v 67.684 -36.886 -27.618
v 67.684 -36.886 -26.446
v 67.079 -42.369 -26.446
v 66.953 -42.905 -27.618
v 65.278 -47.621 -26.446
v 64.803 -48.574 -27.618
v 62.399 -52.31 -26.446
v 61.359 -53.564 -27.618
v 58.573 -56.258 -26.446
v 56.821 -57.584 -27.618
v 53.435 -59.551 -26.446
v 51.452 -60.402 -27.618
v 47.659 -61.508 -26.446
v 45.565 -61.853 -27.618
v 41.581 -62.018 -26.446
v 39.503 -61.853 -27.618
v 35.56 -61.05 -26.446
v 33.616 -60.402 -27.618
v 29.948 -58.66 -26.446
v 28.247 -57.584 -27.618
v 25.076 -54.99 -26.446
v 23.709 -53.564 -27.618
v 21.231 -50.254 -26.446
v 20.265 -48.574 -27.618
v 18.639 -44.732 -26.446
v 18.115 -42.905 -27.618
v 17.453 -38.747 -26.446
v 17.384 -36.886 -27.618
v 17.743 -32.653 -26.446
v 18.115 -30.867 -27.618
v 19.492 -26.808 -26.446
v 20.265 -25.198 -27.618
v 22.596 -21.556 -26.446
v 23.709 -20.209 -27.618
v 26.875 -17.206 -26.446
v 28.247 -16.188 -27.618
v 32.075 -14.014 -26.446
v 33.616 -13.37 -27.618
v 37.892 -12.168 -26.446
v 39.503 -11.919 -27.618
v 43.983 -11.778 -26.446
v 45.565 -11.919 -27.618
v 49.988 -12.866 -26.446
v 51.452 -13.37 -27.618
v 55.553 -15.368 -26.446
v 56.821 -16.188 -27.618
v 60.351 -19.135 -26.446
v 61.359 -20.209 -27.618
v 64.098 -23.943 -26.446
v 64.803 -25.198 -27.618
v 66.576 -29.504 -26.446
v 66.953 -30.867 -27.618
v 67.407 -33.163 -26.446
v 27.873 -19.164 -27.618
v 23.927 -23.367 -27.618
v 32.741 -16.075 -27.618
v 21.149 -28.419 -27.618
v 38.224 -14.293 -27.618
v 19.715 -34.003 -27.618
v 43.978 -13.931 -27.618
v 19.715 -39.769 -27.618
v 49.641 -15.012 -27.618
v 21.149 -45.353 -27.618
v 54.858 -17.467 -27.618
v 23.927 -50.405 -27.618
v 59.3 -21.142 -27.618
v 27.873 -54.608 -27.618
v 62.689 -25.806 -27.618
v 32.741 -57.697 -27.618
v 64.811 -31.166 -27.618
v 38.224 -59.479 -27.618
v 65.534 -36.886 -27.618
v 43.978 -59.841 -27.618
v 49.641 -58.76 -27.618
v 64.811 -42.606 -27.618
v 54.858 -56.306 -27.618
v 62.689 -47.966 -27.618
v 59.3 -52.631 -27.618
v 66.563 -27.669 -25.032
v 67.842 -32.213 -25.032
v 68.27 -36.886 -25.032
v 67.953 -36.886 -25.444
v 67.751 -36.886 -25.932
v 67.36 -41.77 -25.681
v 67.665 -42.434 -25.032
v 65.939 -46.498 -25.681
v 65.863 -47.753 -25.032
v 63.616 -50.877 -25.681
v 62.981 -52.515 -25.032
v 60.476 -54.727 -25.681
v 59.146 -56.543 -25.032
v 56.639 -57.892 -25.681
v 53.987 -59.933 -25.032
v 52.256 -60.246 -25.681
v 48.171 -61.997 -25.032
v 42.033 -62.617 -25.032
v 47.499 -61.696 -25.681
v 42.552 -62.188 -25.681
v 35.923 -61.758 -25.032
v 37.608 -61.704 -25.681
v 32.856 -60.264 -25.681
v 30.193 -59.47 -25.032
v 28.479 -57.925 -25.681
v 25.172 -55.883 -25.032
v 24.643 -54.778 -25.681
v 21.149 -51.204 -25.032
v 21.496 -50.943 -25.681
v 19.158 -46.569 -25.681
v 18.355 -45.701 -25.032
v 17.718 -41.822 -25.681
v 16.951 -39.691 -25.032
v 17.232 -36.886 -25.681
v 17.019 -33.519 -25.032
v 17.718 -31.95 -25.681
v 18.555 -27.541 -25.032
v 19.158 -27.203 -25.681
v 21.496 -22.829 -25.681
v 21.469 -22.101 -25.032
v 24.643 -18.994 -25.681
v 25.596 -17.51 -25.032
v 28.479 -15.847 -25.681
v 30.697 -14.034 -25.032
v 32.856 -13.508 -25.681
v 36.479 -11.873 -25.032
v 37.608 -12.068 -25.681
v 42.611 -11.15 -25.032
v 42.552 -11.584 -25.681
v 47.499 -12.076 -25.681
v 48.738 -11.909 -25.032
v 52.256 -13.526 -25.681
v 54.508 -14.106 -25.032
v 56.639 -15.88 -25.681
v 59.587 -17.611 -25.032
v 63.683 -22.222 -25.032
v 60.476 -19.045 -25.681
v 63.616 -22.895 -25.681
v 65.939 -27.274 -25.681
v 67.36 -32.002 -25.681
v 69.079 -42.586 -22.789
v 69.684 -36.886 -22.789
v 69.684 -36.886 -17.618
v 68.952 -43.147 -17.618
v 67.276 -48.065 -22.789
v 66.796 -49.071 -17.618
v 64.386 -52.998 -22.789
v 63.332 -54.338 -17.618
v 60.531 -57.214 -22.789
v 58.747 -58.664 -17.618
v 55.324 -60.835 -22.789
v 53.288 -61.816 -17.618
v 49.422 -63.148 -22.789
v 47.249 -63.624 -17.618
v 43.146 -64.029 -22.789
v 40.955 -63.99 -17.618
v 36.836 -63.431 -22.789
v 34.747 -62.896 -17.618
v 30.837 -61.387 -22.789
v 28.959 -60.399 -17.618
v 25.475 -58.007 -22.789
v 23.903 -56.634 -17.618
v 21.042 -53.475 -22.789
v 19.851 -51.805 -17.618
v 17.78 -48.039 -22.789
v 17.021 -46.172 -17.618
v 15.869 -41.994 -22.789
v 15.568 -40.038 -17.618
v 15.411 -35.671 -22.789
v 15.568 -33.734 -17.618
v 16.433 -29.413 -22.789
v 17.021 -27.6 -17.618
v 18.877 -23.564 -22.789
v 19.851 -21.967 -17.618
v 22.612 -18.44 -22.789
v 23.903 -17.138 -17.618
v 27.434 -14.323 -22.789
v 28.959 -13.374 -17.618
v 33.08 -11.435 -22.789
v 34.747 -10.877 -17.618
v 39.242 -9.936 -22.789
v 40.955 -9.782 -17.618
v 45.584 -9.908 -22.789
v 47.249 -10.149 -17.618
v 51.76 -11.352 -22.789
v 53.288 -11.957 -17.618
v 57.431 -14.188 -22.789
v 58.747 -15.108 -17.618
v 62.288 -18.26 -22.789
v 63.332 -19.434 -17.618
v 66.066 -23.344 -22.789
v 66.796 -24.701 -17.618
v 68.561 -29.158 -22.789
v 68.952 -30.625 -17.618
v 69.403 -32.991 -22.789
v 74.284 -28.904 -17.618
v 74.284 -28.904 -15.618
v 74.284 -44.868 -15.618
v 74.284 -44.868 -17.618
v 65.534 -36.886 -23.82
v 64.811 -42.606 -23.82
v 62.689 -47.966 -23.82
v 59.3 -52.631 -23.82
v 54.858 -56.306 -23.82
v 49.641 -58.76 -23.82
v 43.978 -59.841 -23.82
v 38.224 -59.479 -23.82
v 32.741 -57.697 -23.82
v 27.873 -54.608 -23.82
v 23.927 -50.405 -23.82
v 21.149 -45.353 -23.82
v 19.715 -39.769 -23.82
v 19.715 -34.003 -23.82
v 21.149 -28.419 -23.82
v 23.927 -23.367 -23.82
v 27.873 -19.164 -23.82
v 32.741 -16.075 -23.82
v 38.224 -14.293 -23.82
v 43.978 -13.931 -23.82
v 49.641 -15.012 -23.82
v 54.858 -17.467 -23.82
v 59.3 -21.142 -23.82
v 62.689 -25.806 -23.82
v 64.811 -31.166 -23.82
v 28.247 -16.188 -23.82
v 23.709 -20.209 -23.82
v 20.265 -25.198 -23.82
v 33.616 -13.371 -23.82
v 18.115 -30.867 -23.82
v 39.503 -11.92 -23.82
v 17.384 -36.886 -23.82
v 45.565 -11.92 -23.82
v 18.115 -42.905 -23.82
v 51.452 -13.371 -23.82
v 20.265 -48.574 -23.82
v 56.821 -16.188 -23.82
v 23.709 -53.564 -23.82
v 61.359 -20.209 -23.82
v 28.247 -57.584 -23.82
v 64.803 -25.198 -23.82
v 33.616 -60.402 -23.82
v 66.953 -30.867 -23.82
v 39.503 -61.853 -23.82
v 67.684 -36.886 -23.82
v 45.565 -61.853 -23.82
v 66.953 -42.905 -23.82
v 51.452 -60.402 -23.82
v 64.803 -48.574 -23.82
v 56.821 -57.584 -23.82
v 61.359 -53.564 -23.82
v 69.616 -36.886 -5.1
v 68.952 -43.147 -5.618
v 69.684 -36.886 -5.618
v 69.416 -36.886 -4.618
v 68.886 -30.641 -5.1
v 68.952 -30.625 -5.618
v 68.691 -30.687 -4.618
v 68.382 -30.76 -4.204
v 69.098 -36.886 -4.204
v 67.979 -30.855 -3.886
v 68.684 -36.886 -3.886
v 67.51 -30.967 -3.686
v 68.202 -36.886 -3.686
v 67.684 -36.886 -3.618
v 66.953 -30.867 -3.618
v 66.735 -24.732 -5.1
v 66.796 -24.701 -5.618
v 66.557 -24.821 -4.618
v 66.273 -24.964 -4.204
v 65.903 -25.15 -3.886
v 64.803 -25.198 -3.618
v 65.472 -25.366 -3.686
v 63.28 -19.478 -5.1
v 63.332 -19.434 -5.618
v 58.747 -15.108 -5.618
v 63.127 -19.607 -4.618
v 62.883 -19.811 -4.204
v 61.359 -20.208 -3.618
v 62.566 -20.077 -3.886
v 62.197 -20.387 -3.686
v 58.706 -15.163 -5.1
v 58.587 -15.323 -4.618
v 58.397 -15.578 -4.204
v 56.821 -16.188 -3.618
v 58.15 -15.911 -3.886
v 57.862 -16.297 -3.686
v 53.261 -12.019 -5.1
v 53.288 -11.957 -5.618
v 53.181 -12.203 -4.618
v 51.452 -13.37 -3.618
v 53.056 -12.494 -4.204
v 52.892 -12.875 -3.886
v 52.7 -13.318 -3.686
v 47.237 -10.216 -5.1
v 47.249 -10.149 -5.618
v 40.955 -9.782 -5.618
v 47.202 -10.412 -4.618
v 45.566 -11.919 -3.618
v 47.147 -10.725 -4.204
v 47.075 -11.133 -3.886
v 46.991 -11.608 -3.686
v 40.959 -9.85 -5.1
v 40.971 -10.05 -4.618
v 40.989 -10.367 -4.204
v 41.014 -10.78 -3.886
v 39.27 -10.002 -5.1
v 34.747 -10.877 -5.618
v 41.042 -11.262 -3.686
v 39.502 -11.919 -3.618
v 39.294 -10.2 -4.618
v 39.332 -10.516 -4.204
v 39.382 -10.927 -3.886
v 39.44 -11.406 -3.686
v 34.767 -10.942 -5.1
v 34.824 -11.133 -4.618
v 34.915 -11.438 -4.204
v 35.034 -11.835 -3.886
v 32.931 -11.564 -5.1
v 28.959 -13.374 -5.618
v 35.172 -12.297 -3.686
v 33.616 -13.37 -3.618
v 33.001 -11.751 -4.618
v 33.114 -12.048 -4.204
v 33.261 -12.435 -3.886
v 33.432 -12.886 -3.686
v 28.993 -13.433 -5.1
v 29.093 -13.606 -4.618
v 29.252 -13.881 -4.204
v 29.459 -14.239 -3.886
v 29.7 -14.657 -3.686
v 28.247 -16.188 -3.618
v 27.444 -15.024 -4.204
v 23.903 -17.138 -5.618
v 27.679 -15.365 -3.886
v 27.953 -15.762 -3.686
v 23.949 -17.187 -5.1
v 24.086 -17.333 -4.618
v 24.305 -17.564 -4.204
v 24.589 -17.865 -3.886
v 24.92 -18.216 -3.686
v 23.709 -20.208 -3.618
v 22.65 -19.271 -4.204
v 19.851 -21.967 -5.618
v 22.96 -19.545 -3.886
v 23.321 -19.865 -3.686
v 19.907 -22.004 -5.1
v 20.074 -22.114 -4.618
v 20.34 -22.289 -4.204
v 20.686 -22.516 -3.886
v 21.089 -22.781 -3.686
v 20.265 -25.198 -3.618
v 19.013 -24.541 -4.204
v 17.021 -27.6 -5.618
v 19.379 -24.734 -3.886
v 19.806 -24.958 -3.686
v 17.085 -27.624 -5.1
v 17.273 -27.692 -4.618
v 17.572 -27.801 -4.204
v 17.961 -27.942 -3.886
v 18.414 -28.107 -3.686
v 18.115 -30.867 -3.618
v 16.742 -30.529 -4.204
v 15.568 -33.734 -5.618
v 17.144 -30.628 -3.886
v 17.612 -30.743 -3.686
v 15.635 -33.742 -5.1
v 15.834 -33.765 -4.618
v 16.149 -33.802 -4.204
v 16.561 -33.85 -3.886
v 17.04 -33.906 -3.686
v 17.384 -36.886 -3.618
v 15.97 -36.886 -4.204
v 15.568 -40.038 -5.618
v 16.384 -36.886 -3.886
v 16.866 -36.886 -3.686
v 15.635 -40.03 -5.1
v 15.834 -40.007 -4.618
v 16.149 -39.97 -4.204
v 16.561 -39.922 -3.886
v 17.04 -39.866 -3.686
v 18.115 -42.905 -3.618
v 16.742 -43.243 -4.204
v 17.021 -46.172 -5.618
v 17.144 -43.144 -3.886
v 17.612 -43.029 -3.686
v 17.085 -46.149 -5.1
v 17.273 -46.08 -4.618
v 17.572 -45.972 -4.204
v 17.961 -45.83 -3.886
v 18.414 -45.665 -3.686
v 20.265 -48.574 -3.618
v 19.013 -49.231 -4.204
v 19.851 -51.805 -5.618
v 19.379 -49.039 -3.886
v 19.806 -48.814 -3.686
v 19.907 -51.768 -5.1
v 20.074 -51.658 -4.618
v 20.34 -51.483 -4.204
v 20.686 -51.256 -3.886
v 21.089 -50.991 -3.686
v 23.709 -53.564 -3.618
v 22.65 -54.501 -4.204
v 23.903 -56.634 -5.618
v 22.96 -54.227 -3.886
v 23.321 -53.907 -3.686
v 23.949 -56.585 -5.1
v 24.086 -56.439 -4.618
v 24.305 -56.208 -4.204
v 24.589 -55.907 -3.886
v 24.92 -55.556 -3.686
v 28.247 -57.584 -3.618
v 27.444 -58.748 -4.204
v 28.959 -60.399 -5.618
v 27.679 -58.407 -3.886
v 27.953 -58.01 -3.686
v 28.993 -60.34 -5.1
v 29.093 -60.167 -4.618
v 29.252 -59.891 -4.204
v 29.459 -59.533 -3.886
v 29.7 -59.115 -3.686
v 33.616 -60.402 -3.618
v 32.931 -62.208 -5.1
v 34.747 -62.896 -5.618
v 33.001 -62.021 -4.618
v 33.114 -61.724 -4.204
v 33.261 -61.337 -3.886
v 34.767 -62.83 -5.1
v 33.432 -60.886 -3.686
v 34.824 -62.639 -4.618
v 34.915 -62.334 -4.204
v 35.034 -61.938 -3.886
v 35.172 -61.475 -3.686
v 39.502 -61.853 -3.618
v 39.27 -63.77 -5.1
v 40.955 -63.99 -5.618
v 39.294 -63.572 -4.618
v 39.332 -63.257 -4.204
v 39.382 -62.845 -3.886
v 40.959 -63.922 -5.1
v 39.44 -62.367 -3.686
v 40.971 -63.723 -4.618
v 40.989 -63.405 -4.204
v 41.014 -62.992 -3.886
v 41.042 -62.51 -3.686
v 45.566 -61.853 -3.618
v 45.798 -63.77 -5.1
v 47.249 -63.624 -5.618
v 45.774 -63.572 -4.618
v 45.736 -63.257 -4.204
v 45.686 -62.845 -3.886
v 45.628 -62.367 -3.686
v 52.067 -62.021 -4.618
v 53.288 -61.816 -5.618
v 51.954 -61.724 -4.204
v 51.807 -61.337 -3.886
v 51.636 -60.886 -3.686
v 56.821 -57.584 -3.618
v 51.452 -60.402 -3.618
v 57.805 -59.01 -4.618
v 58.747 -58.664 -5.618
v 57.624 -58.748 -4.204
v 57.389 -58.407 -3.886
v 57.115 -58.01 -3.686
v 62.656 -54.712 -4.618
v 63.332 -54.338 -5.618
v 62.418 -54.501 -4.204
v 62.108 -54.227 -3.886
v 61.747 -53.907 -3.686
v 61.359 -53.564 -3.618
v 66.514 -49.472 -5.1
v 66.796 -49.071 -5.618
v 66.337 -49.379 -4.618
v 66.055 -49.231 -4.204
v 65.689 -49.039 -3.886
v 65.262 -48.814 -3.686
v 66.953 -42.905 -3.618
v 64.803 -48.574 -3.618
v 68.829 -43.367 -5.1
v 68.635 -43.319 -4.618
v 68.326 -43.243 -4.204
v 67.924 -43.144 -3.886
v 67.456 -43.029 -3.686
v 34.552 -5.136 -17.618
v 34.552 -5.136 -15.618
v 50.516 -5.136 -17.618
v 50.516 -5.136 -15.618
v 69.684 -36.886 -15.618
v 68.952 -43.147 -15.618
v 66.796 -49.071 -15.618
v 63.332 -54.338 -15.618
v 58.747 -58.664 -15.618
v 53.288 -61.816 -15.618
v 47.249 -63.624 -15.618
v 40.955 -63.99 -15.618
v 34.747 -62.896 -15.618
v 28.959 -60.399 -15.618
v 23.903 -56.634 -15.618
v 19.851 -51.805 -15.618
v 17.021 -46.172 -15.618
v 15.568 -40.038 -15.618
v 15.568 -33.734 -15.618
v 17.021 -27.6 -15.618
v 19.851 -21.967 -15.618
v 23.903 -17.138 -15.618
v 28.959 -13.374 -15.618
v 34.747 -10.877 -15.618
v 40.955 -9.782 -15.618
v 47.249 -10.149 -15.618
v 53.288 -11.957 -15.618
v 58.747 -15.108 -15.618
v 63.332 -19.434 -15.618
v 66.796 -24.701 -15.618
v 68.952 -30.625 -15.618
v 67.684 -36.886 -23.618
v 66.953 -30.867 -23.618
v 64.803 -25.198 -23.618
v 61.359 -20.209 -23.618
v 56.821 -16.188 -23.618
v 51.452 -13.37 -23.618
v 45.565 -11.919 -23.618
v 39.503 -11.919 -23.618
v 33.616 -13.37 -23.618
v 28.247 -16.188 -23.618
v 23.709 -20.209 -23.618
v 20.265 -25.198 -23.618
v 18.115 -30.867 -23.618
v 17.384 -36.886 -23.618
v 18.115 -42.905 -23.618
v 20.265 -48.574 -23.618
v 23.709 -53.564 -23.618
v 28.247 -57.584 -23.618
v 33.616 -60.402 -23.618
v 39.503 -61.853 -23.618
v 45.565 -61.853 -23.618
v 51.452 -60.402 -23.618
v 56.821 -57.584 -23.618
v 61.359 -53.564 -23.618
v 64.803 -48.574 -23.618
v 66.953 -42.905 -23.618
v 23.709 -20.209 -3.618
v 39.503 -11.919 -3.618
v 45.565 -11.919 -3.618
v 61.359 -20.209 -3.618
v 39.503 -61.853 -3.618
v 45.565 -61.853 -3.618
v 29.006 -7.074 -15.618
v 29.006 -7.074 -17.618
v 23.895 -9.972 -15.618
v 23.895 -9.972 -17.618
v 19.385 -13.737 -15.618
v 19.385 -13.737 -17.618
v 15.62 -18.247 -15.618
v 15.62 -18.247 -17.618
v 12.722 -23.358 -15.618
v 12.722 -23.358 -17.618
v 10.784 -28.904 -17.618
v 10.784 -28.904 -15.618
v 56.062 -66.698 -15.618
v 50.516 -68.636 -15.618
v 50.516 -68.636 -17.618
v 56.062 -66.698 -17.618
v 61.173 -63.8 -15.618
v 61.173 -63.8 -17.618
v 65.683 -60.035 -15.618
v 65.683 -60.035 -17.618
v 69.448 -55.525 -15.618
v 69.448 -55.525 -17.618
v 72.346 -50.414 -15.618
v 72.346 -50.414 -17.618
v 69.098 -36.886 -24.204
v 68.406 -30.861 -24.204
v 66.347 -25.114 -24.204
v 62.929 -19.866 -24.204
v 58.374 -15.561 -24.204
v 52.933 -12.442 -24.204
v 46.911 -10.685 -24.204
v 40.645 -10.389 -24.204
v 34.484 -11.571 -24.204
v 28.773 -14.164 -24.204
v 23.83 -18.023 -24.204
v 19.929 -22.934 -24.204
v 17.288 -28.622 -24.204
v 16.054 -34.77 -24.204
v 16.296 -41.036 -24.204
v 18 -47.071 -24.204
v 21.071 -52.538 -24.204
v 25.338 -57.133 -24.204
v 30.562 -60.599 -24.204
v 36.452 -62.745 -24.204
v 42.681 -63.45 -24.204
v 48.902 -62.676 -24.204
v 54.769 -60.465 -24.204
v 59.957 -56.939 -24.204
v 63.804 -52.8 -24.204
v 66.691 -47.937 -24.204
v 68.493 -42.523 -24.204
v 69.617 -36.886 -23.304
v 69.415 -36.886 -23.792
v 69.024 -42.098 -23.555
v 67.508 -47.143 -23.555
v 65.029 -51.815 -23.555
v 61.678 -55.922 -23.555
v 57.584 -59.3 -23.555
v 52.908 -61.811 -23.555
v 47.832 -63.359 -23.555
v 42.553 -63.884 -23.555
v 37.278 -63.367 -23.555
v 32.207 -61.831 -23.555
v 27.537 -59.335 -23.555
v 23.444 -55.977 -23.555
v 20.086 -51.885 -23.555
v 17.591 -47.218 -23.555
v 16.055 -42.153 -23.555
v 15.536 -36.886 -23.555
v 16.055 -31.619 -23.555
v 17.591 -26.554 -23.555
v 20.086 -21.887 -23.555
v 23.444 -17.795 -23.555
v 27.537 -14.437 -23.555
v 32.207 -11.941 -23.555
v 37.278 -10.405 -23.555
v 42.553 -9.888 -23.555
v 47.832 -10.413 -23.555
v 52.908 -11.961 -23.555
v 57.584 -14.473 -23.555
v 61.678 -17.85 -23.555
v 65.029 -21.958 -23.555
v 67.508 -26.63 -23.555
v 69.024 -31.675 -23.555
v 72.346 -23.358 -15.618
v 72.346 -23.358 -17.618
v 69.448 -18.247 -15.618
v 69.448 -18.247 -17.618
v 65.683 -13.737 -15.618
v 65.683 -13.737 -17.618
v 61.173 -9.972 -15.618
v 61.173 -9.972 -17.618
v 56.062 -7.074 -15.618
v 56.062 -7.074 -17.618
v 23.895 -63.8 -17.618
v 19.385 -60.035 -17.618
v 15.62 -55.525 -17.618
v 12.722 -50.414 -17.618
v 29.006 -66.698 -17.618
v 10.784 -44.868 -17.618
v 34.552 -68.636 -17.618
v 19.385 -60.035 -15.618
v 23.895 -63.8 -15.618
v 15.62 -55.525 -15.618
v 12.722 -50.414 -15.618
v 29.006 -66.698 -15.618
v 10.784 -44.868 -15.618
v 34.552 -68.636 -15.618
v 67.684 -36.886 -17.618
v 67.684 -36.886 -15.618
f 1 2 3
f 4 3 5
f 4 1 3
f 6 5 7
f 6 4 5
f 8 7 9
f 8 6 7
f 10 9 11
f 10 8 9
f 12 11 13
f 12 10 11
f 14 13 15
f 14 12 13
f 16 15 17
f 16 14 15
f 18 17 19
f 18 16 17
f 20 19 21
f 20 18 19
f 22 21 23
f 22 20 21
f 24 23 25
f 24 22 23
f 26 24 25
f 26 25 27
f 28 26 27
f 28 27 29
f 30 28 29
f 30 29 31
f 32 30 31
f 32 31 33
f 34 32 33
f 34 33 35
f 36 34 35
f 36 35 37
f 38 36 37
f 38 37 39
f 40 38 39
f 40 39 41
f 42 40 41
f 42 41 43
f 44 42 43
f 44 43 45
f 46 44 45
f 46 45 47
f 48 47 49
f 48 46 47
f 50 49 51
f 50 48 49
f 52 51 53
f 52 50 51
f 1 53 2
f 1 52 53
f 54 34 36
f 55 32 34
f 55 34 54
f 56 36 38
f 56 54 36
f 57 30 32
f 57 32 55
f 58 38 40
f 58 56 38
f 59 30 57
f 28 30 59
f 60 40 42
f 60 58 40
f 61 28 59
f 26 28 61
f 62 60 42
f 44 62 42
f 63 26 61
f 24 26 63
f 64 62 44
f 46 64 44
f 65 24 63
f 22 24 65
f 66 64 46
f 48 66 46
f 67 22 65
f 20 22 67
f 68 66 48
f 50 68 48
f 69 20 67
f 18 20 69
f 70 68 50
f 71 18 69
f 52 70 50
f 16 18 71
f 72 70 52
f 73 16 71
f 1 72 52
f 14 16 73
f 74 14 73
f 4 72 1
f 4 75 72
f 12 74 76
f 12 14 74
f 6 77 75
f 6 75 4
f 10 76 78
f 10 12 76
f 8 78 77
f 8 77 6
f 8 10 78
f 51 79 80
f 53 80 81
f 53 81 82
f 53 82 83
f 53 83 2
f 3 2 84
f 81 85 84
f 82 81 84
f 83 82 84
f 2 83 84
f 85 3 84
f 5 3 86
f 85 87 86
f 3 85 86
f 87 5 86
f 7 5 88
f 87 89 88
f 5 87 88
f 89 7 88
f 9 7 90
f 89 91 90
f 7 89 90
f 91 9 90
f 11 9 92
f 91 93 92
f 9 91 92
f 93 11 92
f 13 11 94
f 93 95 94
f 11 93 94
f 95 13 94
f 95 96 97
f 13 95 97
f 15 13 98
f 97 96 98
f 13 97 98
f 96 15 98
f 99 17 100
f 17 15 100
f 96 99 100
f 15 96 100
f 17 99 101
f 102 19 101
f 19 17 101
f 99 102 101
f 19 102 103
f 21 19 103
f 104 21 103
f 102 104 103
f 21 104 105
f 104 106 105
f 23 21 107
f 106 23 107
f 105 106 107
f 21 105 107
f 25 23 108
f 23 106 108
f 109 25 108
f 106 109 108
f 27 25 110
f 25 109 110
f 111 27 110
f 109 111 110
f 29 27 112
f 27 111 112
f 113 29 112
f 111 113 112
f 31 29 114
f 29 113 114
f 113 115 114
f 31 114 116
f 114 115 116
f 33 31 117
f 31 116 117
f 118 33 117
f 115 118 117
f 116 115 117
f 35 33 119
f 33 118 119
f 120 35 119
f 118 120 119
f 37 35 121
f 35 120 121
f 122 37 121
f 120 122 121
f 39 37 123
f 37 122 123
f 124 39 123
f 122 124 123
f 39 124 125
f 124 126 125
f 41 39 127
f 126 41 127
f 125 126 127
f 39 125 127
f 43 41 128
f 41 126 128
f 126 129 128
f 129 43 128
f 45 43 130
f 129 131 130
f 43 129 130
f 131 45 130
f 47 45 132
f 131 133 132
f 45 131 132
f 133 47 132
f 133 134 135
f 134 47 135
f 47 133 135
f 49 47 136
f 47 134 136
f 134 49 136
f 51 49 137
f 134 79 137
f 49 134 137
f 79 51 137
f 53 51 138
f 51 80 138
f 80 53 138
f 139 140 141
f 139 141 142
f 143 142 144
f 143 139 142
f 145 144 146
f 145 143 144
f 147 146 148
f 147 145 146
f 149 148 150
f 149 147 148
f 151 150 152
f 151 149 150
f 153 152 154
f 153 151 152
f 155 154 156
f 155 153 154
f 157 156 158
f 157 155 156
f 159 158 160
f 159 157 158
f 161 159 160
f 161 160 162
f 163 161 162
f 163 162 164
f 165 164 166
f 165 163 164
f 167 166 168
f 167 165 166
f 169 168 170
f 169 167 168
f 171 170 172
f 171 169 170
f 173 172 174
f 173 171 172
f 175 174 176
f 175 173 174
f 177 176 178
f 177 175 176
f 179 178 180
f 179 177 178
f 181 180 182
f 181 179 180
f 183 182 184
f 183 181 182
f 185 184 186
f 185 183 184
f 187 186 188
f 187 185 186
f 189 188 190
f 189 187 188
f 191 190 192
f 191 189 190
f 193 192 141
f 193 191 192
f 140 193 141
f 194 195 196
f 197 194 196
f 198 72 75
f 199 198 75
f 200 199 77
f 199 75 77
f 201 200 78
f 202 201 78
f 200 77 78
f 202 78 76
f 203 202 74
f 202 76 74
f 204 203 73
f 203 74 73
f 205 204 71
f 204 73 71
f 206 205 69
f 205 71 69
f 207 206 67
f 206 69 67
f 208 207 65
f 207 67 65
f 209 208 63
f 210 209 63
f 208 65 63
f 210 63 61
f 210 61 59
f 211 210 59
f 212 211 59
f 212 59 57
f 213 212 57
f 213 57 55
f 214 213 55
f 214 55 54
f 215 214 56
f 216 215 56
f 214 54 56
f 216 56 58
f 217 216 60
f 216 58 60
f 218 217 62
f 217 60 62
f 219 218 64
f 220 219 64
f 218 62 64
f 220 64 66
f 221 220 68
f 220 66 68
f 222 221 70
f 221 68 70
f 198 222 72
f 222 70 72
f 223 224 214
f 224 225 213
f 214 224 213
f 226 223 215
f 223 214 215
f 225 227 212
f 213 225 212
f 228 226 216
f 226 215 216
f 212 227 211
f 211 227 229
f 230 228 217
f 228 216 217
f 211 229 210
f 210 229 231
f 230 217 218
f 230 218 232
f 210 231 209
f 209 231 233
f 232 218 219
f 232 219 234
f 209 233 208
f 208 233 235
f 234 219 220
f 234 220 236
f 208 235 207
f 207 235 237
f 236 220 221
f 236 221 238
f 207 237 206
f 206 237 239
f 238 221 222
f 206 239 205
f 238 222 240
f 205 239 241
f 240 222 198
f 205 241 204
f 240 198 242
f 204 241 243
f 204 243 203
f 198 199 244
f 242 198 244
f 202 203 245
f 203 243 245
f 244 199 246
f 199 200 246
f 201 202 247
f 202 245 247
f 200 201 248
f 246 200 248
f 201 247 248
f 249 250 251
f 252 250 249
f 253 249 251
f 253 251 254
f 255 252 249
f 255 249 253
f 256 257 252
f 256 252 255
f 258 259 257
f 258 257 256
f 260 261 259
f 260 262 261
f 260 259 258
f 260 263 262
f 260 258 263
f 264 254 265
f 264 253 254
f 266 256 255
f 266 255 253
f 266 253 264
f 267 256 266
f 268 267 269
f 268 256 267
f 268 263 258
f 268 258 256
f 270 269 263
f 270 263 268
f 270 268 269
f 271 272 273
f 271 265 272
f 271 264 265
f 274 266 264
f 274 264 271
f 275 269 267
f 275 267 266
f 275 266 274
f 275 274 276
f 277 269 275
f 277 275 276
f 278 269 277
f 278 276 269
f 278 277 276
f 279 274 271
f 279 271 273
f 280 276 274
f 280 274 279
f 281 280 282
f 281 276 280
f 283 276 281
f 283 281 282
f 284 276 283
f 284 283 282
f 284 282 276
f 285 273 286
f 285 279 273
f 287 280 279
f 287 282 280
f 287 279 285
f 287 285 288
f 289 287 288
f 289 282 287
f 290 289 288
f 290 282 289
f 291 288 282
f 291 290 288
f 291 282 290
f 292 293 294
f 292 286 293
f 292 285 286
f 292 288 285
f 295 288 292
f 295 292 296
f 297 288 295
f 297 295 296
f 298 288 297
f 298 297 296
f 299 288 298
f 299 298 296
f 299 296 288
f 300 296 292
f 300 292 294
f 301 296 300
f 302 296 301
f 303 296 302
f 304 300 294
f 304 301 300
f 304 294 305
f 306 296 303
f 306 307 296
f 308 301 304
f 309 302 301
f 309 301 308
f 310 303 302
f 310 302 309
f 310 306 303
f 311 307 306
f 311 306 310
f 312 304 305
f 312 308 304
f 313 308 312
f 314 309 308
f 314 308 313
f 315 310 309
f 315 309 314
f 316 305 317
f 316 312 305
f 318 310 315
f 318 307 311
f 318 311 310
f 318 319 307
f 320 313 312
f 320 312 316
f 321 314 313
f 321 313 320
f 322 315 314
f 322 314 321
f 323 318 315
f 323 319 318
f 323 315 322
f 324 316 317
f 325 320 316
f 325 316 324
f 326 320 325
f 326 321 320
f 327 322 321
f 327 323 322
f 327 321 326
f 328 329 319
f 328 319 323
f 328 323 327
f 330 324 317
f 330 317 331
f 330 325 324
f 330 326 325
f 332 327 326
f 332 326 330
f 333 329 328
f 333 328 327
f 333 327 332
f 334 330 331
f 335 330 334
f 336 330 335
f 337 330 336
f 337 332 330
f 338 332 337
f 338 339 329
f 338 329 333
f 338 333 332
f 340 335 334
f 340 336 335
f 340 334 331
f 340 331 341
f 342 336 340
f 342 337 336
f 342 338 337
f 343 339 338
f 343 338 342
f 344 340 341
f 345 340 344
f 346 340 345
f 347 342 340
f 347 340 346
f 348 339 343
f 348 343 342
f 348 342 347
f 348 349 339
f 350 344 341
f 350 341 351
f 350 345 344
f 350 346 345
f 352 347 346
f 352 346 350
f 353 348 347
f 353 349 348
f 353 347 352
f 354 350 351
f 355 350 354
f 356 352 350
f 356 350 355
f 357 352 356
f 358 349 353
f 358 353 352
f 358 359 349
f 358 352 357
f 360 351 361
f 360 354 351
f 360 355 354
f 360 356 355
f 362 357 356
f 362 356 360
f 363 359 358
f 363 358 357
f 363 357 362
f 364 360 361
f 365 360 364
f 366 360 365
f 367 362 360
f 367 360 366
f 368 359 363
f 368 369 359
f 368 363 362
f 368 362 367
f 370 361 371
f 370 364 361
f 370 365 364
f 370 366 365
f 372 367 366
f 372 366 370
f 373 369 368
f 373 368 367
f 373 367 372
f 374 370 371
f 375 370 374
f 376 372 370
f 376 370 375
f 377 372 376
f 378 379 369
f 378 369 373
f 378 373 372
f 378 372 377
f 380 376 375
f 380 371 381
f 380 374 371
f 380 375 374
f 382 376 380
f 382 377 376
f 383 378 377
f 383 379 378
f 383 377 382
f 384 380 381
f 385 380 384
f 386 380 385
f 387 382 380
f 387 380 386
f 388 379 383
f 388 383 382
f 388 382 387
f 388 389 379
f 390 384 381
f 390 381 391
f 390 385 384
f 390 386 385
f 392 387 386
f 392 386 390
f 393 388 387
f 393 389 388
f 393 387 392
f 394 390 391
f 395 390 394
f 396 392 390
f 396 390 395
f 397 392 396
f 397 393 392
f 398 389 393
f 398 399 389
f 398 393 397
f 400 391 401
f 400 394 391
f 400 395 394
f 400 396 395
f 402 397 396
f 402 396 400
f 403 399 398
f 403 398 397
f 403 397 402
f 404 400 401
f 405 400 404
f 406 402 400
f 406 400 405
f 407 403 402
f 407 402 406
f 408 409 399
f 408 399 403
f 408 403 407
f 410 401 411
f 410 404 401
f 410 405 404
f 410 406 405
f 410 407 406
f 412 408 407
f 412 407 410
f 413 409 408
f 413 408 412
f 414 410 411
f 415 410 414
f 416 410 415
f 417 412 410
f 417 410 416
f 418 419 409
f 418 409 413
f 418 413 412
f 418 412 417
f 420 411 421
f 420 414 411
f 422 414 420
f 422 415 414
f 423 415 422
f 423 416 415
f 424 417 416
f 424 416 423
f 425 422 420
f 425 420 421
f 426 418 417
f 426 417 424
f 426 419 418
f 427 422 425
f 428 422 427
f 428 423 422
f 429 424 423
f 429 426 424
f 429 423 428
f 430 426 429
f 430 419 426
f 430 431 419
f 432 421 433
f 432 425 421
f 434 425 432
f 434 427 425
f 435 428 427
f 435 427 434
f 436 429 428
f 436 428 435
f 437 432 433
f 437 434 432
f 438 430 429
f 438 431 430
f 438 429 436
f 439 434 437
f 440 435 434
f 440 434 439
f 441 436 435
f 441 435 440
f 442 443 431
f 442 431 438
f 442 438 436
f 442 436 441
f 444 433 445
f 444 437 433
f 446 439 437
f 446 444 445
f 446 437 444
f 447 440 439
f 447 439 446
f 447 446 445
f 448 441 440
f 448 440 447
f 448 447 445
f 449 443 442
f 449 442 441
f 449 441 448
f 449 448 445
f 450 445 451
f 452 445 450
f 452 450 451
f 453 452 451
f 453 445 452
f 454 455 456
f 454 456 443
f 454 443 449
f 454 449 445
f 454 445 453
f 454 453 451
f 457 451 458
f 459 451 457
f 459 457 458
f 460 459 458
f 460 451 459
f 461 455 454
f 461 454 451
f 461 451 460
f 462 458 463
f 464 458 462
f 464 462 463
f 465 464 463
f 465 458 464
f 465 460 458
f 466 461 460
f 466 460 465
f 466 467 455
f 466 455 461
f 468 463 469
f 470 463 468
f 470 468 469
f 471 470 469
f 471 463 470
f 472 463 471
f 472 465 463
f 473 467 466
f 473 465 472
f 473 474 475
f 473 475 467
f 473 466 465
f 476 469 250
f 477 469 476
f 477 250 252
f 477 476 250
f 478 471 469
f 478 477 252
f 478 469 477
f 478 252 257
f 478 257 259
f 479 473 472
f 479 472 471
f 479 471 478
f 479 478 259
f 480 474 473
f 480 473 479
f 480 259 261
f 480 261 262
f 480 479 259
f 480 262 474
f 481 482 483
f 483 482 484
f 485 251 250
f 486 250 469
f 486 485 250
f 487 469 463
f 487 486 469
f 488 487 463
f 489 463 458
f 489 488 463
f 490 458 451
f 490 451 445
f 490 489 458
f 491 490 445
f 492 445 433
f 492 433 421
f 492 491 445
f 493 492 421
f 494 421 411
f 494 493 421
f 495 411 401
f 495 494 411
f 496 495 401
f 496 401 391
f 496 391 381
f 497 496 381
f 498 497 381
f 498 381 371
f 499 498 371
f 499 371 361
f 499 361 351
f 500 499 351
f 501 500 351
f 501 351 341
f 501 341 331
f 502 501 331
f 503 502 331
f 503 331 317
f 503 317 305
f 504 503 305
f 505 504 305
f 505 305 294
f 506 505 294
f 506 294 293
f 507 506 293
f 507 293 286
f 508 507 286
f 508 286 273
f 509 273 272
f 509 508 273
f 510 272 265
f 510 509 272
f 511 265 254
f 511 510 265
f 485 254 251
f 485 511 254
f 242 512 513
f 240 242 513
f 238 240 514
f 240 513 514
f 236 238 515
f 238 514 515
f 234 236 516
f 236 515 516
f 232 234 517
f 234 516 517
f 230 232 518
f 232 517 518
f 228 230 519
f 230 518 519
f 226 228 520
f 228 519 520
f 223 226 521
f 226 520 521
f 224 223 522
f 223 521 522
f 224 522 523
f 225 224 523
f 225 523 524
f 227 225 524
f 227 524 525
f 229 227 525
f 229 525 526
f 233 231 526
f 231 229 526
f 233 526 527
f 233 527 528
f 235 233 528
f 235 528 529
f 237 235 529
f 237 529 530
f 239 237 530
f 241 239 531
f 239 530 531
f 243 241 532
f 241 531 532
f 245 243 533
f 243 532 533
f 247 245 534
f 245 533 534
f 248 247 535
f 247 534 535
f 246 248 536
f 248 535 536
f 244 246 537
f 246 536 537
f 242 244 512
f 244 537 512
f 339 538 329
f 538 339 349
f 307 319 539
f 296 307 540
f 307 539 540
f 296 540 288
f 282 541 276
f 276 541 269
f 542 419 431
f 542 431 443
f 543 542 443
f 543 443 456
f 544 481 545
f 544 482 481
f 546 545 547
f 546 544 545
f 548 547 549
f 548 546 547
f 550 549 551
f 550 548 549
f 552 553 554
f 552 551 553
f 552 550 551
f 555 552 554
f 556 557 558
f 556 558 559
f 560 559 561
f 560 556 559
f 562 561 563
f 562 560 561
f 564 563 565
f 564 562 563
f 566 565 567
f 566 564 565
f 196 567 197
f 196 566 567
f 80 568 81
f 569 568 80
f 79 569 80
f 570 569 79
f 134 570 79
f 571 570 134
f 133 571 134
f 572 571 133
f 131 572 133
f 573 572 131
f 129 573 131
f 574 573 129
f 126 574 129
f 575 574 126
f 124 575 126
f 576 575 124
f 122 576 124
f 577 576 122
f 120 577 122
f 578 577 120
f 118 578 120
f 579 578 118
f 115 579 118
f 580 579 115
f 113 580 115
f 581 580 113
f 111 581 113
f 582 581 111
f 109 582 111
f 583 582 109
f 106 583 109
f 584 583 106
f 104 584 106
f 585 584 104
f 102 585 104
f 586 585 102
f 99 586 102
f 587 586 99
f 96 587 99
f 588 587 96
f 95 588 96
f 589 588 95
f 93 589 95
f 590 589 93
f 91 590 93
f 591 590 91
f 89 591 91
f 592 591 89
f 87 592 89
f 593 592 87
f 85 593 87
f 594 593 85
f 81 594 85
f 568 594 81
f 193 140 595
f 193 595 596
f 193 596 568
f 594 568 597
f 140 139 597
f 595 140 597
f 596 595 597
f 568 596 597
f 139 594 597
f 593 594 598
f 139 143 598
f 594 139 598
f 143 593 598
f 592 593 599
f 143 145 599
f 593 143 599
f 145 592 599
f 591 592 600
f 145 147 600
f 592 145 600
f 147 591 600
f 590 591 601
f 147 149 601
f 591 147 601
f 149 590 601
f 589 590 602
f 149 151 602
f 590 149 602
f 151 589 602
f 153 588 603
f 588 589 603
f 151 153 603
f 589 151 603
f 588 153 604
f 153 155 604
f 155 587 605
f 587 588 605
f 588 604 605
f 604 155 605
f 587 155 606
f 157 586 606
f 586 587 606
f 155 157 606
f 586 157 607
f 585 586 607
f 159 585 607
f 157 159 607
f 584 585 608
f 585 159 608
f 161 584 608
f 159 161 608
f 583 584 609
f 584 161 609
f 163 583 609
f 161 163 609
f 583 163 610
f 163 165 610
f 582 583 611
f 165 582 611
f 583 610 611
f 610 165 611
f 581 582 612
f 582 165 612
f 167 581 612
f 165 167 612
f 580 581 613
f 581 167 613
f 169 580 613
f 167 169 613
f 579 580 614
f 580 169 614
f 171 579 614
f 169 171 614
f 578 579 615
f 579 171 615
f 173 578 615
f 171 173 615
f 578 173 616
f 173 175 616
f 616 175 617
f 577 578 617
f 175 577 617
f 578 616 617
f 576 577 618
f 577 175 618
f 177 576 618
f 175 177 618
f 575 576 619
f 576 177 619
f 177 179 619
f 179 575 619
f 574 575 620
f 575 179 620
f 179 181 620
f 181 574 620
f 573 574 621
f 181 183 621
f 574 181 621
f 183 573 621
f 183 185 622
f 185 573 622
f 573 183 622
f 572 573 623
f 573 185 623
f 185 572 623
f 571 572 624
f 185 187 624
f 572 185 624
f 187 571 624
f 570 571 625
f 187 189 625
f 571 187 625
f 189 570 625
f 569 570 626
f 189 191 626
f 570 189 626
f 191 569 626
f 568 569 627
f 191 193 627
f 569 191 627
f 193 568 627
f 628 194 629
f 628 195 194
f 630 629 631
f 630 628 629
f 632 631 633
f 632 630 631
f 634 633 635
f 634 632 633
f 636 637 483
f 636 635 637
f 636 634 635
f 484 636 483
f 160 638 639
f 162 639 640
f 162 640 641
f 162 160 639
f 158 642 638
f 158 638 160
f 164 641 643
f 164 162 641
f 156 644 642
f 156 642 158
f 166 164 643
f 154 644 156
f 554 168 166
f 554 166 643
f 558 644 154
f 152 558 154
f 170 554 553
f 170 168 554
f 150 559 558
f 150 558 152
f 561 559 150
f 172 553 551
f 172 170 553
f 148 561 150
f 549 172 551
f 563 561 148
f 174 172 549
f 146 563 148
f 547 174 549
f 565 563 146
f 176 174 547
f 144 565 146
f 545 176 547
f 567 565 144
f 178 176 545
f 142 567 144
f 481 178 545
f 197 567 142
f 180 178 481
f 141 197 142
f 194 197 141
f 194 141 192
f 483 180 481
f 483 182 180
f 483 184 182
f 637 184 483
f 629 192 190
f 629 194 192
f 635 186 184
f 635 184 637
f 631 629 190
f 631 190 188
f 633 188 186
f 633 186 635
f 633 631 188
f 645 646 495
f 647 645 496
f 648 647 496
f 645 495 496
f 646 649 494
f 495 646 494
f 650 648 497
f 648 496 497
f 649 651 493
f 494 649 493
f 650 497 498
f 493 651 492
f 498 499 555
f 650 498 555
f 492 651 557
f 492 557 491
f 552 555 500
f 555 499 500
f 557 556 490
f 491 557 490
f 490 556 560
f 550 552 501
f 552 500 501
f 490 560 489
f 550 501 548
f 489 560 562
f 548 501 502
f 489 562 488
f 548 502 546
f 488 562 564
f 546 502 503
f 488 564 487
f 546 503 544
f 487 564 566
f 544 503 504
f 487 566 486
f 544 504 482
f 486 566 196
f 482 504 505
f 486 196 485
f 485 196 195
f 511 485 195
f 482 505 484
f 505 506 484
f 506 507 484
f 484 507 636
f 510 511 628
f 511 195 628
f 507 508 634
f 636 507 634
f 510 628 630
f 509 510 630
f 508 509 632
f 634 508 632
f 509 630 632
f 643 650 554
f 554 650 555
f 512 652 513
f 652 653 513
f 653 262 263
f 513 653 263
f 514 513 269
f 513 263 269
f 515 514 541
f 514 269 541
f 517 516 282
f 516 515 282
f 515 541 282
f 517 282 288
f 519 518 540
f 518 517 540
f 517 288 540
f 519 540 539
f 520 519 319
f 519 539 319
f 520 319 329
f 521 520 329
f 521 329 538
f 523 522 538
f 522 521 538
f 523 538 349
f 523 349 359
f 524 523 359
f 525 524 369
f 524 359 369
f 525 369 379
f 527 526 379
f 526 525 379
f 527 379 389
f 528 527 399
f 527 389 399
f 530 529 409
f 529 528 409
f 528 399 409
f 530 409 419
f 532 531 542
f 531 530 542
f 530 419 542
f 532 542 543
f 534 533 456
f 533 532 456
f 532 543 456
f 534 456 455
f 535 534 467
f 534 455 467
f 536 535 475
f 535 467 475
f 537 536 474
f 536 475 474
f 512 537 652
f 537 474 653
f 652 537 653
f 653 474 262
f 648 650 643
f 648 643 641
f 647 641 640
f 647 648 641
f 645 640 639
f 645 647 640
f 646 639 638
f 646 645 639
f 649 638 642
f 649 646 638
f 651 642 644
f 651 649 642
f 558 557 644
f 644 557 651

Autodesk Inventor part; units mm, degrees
ref_plane "YZ Plane" through (0, 0, 0) normal (1, 0, 0) x (0, 1, 0)
ref_plane "XZ Plane" through (0, 0, 0) normal (0, 1, 0) x (-1, 0, 0)
ref_plane "XY Plane" through (0, 0, 0) normal (0, 0, 1) x (1, 0, 0)
ref_plane "Work Plane1" through (67.8466, -36.9116, -13.6178) normal (0, 0, -1) x (1, 0, 0)
sketch "Sketch1" plane through (67.8466, -36.9116, -13.6178) normal (0, 0, -1) x (1, 0, 0)
  circle A0 centre (-25.3126, -0.0255) radius 25 projected
  circle A1 centre (-25.3126, -0.0255) radius 25.15
  circle A2 centre (-25.3126, -0.0255) radius 27.15
  point P0 (-67.8466, -36.9116)
  dimension "d8" = 0.15
  dimension "d9" = 2
  dimension "d26" = 54.3
extrude "Extrusion2" add sketch "Sketch1" along normal mid plane 20 contours A2
fillet "Fillet3" radius 2 1 edges at (15.384, -36.8861, -3.6178)
ref_plane "Work Plane3" through (73.8334, -36.8861, -23.6178) normal (0, 1, 0) x (-1, 0, 0)
sketch "Sketch4" plane through (73.8334, -36.8861, -23.6178) normal (0, 1, 0) x (-1, 0, 0)
  line L0 (6.1494, 20) -> (6.1494, 0) construction
  line L1 (56.4494, 20) -> (56.4494, 0) construction
  line L2 (4.1494, 0) -> (6.1494, -2)
  line L3 (6.1494, -2) -> (6.1494, -4)
  line L4 (6.1494, -4) -> (8.1494, -4)
  line L5 (31.2994, 0.6713) -> (31.2994, 28.2514) construction
  line L6 (31.2994, 28.2514) -> (31.2994, -7.4559) construction
  line L7 (8.1494, -0.2025) -> (6.2913, -0.2025)
  line L8 (4.1494, 0) -> (6.1496, 0)
  line L9 (4.1494, 0) -> (6.1494, 0) construction
  line L10 (6.2911, 0) -> (6.9778, 0) construction
  line L11 (6.2913, -0.2025) -> (6.1496, -0.2025)
  line L12 (6.1496, -0.2025) -> (6.1496, 0)
  line L13 (8.2994, -0.2025) -> (8.2994, 19.7975) construction
  line L14 (8.1494, -0.2025) -> (8.2994, -0.2025)
  line L15 (8.2994, -0.2025) -> (8.2994, -4)
  line L16 (8.2994, -4) -> (8.1494, -4)
  point P0 (73.8334, 23.6178)
  dimension "d18" = 2
revolve "Revolution1" add sketch "Sketch4" angle 360 about axis through (42.534, -36.8861, 4.6336) along (0, 0, -1)
fillet "Fillet5" radius 2 2 edges at (17.384, -36.8861, -25.6178) (15.384, -36.8861, -23.6178)
ref_plane "Work Plane12" through (42.534, -36.8861, -15.6178) normal (0, 0, -1) x (0, 1, 0)
sketch "Sketch6" plane through (42.534, -36.8861, -15.6178) normal (0, 0, -1) x (0, 1, 0)
  line L0 (5, 31.75) -> (-5, 31.75)
  line L1 (31.75, -7.9821) -> (31.75, 7.9821)
  line L2 (7.9821, 31.75) -> (-7.9821, 31.75)
  line L3 (-31.75, 7.9821) -> (-31.75, -7.9821)
  line L4 (-7.9821, -31.75) -> (7.9821, -31.75)
  arc A0 (-31.75, -7.9821) -> (-7.9821, -31.75) centre (0, 0) ccw
  arc A1 (-7.9821, 31.75) -> (-31.75, 7.9821) centre (0, 0) ccw
  arc A2 (7.9821, -31.75) -> (31.75, -7.9821) centre (0, 0) ccw
  arc A3 (31.75, 7.9821) -> (7.9821, 31.75) centre (0, 0) ccw
  line L5 (-1.7661, -31.75) -> (7.9821, -31.75)
  arc A4 (-7.9821, 31.75) -> (-31.75, 7.9821) centre (0, 0) ccw
  arc A5 (-31.75, -7.9821) -> (-7.9821, -31.75) centre (0, 0) ccw
  arc A6 (7.9821, -31.75) -> (31.75, -7.9821) centre (0, 0) ccw
  arc A7 (31.75, 7.9821) -> (7.9821, 31.75) centre (0, 0) ccw
extrude "Extrusion4" add sketch "Sketch6" along normal blind 2
sketch "Sketch7" plane through (42.534, -36.8861, -27.6178) normal (0, 0, -1) x (-1, 0, 0)
  circle A0 centre (0, 0) radius 23 construction
  circle A1 centre (0, 0) radius 25.15 construction
  line L0 (0, -40.051) -> (0, 42.9038) construction
  line L1 (-48.7042, 0) -> (50.8727, 0) construction
ref_plane "plano de separación con el cono" through (42.534, -36.8861, -28.0178) normal (0, 0, -1) x (-1, 0, 0)
sketch "Sketch8" plane through (42.534, -36.8861, -15.6178) normal (0, 0, 1) x (1, 0, 0)
  circle A0 centre (0, 0) radius 25.15 projected
  point P0 (-42.534, 36.8861)
extrude "Extrusion5" cut sketch "Sketch8" against normal up to surface (2 mm away)
equation "\"d8\" = HOLE_TOLERANCE"
equation "\"HOLE_TOLERANCE\" = 0.15"
properties part number "adaptador_cono" material "PET Plastic"
